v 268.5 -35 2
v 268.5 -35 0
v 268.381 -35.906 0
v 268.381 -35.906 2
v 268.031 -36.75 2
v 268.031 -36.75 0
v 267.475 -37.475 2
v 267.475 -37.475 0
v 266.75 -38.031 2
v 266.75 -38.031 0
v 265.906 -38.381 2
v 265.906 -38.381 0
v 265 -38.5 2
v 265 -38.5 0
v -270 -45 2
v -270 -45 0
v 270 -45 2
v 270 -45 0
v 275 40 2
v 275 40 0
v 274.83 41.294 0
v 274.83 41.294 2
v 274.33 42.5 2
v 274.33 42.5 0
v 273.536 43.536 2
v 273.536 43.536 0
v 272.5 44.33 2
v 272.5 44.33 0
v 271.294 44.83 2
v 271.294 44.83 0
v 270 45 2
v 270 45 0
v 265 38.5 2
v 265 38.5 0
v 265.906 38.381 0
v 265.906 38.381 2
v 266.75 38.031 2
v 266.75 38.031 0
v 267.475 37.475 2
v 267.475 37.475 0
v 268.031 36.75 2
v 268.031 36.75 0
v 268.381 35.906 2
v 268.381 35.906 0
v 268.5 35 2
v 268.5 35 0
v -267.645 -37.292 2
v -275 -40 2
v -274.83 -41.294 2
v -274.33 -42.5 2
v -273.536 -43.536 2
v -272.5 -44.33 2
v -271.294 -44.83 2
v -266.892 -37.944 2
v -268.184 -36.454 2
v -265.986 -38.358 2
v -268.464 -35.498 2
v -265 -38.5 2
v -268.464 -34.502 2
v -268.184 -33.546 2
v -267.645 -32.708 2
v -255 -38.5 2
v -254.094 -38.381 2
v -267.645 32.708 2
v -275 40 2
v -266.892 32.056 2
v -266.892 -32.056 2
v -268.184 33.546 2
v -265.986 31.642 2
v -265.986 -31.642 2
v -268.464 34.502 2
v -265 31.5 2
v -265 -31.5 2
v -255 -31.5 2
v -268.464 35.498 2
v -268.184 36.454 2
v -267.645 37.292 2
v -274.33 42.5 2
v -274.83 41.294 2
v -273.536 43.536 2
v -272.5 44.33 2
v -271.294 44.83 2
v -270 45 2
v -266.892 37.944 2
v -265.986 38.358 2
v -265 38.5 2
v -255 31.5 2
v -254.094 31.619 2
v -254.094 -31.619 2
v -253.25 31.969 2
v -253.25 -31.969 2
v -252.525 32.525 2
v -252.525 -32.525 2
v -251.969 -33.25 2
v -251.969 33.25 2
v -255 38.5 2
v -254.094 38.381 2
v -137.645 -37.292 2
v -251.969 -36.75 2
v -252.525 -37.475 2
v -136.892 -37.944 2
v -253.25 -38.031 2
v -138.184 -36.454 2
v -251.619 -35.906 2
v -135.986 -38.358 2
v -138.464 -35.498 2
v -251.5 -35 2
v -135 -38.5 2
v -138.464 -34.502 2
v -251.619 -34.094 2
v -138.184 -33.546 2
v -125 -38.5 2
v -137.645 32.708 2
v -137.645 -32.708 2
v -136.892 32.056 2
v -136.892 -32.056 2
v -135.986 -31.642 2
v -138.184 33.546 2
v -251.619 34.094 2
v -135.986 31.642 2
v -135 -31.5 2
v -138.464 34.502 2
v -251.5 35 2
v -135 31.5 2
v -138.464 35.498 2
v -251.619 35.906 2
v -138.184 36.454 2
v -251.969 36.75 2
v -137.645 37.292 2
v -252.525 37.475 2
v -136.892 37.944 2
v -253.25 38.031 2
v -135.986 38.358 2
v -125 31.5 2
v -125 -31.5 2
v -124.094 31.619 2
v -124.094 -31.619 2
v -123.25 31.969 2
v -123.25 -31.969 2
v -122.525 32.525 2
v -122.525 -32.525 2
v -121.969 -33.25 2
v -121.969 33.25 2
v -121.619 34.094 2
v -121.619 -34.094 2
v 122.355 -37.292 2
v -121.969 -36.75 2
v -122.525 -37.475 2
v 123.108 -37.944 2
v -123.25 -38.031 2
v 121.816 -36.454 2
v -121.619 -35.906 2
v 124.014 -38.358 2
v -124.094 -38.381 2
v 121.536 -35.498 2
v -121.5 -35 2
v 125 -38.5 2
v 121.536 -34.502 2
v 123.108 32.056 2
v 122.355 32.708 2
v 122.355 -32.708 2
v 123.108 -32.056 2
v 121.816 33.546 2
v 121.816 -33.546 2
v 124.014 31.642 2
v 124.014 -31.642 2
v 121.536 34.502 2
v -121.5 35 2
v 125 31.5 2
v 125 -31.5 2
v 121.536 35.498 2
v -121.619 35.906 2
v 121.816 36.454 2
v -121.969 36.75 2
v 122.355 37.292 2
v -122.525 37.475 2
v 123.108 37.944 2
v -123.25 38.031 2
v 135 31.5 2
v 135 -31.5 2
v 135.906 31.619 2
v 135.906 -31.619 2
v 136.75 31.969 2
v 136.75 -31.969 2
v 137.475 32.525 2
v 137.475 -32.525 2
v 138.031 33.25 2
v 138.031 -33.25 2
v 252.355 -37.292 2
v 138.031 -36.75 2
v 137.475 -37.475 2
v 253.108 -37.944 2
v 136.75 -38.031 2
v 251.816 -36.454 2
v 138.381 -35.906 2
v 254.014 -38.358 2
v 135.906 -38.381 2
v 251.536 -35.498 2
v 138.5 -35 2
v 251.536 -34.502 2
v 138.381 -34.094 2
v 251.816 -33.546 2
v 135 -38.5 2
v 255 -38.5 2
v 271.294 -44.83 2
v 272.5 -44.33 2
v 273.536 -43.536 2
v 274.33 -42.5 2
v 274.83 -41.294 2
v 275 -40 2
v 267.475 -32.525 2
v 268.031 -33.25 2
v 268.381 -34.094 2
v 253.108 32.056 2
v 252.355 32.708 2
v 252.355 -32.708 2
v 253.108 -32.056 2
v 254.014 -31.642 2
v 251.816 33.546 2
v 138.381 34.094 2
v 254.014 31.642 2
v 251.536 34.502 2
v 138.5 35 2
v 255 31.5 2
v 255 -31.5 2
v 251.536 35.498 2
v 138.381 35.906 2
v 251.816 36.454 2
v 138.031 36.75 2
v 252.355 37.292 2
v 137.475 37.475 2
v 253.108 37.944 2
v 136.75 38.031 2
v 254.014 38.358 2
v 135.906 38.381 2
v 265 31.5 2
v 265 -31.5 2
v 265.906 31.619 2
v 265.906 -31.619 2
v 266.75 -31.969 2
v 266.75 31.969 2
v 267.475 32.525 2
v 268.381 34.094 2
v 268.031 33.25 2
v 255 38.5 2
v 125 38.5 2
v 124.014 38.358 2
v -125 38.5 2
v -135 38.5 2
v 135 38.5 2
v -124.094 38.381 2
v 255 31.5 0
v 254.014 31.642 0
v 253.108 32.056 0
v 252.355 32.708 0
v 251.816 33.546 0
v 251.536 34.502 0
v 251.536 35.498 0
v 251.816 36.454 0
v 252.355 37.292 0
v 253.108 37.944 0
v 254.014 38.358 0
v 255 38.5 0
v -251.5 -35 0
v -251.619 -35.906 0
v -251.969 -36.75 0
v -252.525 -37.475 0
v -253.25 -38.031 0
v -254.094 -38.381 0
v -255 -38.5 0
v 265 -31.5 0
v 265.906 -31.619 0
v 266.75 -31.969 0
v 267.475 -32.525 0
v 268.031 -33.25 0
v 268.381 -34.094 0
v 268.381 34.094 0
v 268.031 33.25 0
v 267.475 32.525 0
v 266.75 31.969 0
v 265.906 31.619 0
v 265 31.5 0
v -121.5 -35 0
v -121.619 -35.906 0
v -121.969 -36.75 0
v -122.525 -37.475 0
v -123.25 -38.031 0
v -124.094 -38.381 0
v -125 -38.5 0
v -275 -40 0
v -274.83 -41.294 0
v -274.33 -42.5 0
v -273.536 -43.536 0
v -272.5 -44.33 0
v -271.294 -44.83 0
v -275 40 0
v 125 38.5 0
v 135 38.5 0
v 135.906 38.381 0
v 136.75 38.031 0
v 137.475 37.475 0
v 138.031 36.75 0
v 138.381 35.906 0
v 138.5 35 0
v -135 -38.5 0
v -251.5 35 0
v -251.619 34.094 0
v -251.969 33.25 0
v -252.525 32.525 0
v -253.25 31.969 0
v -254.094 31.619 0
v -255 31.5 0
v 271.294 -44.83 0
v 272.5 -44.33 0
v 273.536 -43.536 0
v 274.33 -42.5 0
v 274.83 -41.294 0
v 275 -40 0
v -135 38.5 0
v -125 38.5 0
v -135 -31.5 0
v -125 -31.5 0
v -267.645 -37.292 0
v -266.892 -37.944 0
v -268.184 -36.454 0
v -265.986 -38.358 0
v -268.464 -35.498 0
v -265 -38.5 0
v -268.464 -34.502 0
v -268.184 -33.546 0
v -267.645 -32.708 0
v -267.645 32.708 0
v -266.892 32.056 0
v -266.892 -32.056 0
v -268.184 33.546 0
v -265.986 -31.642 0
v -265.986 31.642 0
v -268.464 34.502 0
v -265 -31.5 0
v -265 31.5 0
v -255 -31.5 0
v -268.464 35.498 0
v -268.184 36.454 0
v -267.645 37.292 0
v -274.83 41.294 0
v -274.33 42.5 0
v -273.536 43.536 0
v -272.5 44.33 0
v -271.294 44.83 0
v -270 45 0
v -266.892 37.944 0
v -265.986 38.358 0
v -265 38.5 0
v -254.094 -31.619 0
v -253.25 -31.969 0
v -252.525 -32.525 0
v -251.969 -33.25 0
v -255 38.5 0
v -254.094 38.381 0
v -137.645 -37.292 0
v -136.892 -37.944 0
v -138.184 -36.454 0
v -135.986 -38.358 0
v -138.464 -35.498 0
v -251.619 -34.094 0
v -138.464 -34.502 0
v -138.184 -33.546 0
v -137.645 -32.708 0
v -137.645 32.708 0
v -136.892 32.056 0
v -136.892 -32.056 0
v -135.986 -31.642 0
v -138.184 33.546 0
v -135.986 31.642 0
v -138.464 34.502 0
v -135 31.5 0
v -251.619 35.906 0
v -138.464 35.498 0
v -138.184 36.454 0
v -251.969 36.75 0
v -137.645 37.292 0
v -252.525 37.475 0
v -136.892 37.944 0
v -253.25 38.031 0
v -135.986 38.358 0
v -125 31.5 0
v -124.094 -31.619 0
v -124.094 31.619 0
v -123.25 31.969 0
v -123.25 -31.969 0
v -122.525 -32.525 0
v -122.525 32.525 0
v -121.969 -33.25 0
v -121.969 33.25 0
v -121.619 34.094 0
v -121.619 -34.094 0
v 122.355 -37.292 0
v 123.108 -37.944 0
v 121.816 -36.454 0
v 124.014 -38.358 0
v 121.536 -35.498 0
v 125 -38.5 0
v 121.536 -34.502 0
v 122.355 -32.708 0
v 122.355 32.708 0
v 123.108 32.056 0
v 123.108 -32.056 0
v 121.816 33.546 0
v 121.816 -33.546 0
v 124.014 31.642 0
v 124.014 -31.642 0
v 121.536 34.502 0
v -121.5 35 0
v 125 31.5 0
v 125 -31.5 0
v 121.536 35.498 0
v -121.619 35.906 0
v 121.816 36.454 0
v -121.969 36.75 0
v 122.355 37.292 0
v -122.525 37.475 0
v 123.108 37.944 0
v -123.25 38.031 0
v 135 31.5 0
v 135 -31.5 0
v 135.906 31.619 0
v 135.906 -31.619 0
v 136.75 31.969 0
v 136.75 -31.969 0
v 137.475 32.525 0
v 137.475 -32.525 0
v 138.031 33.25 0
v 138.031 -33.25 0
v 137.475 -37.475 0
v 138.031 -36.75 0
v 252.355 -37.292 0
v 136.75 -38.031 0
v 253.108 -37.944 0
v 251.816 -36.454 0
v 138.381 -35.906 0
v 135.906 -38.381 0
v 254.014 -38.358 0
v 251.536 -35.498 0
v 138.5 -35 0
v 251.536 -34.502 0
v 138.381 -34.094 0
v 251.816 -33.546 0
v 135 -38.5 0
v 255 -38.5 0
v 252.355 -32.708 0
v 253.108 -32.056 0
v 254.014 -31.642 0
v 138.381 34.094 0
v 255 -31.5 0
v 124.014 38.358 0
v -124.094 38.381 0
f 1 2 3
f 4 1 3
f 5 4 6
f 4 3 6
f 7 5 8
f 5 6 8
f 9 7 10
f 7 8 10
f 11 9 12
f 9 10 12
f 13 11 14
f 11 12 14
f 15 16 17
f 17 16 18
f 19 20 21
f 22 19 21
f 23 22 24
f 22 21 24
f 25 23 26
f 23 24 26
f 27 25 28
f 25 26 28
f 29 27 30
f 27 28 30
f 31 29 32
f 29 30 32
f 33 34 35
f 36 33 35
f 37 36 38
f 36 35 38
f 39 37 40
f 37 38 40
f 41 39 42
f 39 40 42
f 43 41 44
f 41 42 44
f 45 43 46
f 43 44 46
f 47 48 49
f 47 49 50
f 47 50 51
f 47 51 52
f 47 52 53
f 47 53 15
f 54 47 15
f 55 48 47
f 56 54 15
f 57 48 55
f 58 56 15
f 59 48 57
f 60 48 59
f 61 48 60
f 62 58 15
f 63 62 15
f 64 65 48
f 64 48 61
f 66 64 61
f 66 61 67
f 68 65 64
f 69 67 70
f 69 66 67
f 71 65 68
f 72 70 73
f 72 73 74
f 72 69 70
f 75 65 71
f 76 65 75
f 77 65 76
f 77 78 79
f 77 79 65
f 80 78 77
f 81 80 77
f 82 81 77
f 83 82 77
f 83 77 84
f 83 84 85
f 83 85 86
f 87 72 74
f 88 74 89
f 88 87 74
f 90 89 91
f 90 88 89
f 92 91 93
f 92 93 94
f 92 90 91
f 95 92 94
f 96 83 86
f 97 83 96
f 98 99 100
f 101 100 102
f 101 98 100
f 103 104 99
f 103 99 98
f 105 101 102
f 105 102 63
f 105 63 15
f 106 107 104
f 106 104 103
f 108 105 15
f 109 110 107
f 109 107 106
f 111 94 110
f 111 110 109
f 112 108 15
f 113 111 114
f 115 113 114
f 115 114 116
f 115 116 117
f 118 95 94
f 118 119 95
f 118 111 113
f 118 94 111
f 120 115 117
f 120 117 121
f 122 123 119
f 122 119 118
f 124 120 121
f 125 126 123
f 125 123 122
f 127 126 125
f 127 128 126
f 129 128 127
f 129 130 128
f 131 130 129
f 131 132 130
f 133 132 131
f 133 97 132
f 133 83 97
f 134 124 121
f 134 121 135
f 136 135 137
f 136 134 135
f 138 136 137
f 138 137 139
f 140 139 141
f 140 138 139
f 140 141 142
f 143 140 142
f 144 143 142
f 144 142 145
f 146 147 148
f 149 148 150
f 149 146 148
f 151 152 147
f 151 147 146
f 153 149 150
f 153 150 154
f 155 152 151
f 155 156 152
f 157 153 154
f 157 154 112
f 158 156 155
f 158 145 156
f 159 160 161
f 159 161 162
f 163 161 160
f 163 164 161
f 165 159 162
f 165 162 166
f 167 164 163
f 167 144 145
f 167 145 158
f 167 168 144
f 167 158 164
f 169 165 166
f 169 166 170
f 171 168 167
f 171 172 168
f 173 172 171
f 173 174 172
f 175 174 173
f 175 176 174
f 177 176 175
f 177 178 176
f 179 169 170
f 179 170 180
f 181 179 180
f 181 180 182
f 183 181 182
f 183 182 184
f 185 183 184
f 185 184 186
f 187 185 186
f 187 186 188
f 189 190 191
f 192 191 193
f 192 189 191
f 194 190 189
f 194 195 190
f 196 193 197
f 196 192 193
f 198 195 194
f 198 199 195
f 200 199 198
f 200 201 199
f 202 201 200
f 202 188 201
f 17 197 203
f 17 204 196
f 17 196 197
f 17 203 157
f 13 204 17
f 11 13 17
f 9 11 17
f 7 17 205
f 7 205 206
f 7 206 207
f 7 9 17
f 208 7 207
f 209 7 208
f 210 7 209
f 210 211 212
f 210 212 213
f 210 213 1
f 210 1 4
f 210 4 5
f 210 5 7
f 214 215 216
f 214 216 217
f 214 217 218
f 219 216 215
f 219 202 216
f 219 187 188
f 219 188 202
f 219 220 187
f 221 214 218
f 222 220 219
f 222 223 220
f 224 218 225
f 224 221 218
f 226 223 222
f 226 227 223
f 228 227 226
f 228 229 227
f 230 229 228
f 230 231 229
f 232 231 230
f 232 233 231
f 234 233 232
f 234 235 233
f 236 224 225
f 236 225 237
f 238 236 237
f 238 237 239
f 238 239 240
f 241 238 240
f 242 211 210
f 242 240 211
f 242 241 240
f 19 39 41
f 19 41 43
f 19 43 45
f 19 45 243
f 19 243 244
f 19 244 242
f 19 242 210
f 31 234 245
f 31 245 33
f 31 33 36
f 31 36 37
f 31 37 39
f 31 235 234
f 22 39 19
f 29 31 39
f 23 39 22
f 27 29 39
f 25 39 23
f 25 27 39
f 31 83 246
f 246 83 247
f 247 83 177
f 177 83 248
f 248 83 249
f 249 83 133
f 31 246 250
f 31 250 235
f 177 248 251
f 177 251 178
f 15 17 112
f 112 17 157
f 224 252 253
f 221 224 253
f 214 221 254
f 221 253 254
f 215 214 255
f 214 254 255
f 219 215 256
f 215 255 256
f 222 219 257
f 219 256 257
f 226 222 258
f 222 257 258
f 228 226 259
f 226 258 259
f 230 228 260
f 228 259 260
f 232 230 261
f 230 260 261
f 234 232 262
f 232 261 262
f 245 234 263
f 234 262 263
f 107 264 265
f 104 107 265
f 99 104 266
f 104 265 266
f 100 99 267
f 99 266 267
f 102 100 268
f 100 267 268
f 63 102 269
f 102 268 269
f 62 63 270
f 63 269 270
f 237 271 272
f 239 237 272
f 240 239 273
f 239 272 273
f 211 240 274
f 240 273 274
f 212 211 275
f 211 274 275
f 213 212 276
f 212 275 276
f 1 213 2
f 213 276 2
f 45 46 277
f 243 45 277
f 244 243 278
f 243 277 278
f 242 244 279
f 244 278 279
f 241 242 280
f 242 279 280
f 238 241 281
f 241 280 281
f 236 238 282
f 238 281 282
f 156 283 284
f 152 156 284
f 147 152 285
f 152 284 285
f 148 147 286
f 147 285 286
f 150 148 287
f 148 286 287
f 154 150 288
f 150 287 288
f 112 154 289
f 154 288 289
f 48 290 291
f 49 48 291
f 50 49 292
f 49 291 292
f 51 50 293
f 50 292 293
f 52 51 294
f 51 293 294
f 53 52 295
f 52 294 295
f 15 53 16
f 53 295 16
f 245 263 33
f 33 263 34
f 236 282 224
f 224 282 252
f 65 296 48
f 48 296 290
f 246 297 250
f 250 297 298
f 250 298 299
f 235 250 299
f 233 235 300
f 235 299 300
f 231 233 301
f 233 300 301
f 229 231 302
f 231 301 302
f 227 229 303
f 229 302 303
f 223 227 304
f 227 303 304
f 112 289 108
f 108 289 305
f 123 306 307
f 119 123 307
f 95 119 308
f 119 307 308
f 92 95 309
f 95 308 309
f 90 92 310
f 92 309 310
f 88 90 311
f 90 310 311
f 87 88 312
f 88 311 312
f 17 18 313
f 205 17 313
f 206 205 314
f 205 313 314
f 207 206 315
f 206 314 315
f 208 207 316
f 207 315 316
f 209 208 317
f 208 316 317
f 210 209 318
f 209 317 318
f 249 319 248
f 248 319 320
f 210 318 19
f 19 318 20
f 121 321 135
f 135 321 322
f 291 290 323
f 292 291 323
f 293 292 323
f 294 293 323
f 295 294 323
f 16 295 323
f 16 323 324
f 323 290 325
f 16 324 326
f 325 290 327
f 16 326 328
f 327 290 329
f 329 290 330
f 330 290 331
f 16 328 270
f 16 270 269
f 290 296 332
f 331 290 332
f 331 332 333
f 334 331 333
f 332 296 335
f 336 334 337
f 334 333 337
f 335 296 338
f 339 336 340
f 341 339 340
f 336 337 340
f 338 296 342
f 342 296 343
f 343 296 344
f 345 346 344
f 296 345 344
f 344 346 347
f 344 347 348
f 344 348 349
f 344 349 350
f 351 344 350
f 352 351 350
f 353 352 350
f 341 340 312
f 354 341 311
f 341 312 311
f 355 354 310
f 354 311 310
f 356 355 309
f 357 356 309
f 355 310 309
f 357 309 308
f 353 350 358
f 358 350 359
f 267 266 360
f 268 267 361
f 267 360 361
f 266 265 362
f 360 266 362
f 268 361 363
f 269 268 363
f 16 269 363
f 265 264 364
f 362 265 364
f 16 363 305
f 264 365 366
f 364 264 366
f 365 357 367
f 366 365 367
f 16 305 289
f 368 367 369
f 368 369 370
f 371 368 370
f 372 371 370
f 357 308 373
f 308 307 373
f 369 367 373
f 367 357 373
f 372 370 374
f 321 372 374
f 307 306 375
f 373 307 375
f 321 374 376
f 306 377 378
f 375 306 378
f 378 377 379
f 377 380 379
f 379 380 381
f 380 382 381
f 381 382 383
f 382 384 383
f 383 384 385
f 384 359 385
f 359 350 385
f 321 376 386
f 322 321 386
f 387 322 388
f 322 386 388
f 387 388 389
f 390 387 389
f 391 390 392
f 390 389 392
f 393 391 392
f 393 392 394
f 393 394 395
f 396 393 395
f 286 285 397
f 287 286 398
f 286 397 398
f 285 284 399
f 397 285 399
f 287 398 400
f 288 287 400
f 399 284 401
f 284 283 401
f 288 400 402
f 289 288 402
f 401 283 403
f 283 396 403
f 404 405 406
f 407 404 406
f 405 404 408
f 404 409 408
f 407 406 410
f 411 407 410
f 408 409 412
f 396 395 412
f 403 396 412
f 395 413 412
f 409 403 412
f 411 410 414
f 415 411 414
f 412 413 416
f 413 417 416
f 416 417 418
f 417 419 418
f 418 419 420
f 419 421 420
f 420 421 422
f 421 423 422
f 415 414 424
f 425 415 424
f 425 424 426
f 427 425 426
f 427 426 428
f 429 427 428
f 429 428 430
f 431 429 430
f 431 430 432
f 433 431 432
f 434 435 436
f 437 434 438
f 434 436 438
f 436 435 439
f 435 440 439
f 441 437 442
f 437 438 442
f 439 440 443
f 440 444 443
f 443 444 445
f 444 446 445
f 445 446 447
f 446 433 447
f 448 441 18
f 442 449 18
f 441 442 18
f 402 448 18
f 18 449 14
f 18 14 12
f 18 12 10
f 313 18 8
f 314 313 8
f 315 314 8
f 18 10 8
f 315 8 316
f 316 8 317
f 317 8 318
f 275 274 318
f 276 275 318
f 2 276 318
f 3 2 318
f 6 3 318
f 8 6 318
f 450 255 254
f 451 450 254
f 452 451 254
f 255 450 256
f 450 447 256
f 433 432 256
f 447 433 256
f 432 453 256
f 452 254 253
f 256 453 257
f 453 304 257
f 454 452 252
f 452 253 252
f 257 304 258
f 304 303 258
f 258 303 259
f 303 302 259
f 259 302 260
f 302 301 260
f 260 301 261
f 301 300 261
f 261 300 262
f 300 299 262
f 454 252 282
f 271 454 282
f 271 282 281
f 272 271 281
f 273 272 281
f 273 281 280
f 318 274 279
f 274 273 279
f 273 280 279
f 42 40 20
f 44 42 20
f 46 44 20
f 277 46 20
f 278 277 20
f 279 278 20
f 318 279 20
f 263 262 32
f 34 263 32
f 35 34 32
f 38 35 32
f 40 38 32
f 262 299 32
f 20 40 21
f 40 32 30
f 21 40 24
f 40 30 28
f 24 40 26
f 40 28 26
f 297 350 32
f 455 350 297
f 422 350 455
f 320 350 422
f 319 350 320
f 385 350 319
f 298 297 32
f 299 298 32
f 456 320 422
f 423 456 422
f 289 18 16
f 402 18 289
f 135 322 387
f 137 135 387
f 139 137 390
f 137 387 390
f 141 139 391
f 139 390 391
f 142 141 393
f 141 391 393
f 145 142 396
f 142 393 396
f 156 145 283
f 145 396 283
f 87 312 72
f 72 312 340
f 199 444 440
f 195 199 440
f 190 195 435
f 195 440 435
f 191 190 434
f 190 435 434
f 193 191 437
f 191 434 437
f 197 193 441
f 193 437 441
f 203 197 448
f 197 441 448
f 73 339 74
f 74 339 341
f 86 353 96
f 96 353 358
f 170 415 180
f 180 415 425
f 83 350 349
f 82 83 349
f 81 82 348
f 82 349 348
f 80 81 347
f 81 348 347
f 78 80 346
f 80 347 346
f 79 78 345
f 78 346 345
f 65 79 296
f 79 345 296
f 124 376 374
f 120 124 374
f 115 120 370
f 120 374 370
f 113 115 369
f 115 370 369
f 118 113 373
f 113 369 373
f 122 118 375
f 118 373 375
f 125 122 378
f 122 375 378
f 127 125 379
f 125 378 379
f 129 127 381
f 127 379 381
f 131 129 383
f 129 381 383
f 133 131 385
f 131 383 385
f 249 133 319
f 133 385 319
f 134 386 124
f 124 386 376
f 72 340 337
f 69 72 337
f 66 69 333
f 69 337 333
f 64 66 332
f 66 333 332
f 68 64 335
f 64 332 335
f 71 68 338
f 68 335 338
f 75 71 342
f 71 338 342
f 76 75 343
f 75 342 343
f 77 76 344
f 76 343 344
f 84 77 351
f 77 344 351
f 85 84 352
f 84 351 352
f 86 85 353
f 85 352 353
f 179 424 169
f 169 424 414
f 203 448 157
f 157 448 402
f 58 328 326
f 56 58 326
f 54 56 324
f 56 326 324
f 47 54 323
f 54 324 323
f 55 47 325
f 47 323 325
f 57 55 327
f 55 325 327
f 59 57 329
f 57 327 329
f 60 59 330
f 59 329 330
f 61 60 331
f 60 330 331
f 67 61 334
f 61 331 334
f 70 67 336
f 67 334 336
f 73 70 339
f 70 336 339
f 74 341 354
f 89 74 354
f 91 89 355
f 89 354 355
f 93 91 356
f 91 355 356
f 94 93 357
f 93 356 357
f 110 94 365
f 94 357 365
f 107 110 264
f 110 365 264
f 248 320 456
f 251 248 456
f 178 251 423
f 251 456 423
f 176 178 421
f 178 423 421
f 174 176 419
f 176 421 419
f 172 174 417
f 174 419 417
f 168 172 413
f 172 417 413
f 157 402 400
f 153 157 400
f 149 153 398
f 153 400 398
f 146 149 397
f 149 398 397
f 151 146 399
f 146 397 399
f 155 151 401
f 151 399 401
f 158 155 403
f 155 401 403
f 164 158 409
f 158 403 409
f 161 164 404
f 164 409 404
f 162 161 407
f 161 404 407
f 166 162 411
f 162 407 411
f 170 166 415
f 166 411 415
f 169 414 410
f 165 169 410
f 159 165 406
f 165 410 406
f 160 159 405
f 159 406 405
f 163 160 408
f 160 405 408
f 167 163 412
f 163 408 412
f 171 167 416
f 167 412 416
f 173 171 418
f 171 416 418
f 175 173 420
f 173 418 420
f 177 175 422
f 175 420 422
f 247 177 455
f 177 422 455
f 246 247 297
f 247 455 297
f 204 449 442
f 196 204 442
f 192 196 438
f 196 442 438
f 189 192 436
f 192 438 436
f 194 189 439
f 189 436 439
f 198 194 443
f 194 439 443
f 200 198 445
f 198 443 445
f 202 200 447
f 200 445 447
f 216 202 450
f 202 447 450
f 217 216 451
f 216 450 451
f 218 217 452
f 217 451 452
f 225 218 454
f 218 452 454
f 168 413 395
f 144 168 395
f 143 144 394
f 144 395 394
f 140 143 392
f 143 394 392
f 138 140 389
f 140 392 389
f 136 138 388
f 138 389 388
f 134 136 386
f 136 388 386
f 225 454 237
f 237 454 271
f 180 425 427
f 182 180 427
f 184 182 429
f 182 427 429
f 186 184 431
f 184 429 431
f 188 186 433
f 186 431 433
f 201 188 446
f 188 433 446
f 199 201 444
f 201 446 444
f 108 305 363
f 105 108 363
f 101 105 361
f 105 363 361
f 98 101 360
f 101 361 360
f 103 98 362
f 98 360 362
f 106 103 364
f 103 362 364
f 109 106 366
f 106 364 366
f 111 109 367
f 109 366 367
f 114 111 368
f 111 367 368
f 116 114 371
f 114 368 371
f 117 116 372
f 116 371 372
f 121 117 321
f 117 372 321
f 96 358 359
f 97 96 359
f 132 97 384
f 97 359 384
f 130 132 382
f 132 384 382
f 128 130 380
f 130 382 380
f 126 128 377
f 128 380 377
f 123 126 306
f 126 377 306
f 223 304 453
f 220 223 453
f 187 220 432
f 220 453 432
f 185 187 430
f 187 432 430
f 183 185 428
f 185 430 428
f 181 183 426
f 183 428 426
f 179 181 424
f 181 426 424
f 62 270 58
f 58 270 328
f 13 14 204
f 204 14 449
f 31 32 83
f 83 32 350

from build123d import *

# Parameters (mm, degrees)
F1_DEPTH = 2


with BuildPart() as f1:
    # F0 (on Top) → F1 (new body)
    with BuildSketch(Plane.XY):
        with BuildLine():
            ThreePointArc((275, 40), (273.535534, 43.535534), (270, 45))
            Line((270, 45), (-270, 45))
            ThreePointArc((-270, 45), (-273.535534, 43.535534), (-275, 40))
            Line((-275, 40), (-275, -40))
            ThreePointArc((-275, -40), (-273.535534, -43.535534), (-270, -45))
            Line((-270, -45), (270, -45))
            ThreePointArc((270, -45), (273.535534, -43.535534), (275, -40))
            Line((275, -40), (275, 40))
        make_face()
        with BuildLine():
            ThreePointArc((-251.5, -35), (-252.525126, -37.474874), (-255, -38.5))
            Line((-255, -38.5), (-265, -38.5))
            ThreePointArc((-265, -38.5), (-268.5, -35), (-265, -31.5))
            Line((-265, -31.5), (-255, -31.5))
            ThreePointArc((-255, -31.5), (-252.525126, -32.525126), (-251.5, -35))
        make_face(mode=Mode.SUBTRACT)
        with BuildLine():
            ThreePointArc((-121.5, -35), (-122.525126, -37.474874), (-125, -38.5))
            Line((-125, -38.5), (-135, -38.5))
            ThreePointArc((-135, -38.5), (-138.5, -35), (-135, -31.5))
            Line((-135, -31.5), (-125, -31.5))
            ThreePointArc((-125, -31.5), (-122.525126, -32.525126), (-121.5, -35))
        make_face(mode=Mode.SUBTRACT)
        with BuildLine():
            ThreePointArc((125, -38.5), (121.5, -35), (125, -31.5))
            Line((125, -31.5), (135, -31.5))
            ThreePointArc((135, -31.5), (137.474874, -32.525126), (138.5, -35))
            ThreePointArc((138.5, -35), (137.474874, -37.474874), (135, -38.5))
            Line((135, -38.5), (125, -38.5))
        make_face(mode=Mode.SUBTRACT)
        with BuildLine():
            ThreePointArc((255, -38.5), (251.5, -35), (255, -31.5))
            Line((255, -31.5), (265, -31.5))
            ThreePointArc((265, -31.5), (267.474874, -32.525126), (268.5, -35))
            ThreePointArc((268.5, -35), (267.474874, -37.474874), (265, -38.5))
            Line((265, -38.5), (255, -38.5))
        make_face(mode=Mode.SUBTRACT)
        with BuildLine():
            ThreePointArc((-265, 31.5), (-268.5, 35), (-265, 38.5))
            Line((-265, 38.5), (-255, 38.5))
            ThreePointArc((-255, 38.5), (-252.525126, 37.474874), (-251.5, 35))
            ThreePointArc((-251.5, 35), (-252.525126, 32.525126), (-255, 31.5))
            Line((-255, 31.5), (-265, 31.5))
        make_face(mode=Mode.SUBTRACT)
        with BuildLine():
            ThreePointArc((-135, 31.5), (-138.5, 35), (-135, 38.5))
            Line((-135, 38.5), (-125, 38.5))
            ThreePointArc((-125, 38.5), (-122.525126, 37.474874), (-121.5, 35))
            ThreePointArc((-121.5, 35), (-122.525126, 32.525126), (-125, 31.5))
            Line((-125, 31.5), (-135, 31.5))
        make_face(mode=Mode.SUBTRACT)
        with BuildLine():
            ThreePointArc((125, 31.5), (121.5, 35), (125, 38.5))
            Line((125, 38.5), (135, 38.5))
            ThreePointArc((135, 38.5), (137.474874, 37.474874), (138.5, 35))
            ThreePointArc((138.5, 35), (137.474874, 32.525126), (135, 31.5))
            Line((135, 31.5), (125, 31.5))
        make_face(mode=Mode.SUBTRACT)
        with BuildLine():
            ThreePointArc((255, 31.5), (251.5, 35), (255, 38.5))
            Line((255, 38.5), (265, 38.5))
            ThreePointArc((265, 38.5), (267.474874, 37.474874), (268.5, 35))
            ThreePointArc((268.5, 35), (267.474874, 32.525126), (265, 31.5))
            Line((265, 31.5), (255, 31.5))
        make_face(mode=Mode.SUBTRACT)
    extrude(amount=F1_DEPTH)


solid = f1.part
